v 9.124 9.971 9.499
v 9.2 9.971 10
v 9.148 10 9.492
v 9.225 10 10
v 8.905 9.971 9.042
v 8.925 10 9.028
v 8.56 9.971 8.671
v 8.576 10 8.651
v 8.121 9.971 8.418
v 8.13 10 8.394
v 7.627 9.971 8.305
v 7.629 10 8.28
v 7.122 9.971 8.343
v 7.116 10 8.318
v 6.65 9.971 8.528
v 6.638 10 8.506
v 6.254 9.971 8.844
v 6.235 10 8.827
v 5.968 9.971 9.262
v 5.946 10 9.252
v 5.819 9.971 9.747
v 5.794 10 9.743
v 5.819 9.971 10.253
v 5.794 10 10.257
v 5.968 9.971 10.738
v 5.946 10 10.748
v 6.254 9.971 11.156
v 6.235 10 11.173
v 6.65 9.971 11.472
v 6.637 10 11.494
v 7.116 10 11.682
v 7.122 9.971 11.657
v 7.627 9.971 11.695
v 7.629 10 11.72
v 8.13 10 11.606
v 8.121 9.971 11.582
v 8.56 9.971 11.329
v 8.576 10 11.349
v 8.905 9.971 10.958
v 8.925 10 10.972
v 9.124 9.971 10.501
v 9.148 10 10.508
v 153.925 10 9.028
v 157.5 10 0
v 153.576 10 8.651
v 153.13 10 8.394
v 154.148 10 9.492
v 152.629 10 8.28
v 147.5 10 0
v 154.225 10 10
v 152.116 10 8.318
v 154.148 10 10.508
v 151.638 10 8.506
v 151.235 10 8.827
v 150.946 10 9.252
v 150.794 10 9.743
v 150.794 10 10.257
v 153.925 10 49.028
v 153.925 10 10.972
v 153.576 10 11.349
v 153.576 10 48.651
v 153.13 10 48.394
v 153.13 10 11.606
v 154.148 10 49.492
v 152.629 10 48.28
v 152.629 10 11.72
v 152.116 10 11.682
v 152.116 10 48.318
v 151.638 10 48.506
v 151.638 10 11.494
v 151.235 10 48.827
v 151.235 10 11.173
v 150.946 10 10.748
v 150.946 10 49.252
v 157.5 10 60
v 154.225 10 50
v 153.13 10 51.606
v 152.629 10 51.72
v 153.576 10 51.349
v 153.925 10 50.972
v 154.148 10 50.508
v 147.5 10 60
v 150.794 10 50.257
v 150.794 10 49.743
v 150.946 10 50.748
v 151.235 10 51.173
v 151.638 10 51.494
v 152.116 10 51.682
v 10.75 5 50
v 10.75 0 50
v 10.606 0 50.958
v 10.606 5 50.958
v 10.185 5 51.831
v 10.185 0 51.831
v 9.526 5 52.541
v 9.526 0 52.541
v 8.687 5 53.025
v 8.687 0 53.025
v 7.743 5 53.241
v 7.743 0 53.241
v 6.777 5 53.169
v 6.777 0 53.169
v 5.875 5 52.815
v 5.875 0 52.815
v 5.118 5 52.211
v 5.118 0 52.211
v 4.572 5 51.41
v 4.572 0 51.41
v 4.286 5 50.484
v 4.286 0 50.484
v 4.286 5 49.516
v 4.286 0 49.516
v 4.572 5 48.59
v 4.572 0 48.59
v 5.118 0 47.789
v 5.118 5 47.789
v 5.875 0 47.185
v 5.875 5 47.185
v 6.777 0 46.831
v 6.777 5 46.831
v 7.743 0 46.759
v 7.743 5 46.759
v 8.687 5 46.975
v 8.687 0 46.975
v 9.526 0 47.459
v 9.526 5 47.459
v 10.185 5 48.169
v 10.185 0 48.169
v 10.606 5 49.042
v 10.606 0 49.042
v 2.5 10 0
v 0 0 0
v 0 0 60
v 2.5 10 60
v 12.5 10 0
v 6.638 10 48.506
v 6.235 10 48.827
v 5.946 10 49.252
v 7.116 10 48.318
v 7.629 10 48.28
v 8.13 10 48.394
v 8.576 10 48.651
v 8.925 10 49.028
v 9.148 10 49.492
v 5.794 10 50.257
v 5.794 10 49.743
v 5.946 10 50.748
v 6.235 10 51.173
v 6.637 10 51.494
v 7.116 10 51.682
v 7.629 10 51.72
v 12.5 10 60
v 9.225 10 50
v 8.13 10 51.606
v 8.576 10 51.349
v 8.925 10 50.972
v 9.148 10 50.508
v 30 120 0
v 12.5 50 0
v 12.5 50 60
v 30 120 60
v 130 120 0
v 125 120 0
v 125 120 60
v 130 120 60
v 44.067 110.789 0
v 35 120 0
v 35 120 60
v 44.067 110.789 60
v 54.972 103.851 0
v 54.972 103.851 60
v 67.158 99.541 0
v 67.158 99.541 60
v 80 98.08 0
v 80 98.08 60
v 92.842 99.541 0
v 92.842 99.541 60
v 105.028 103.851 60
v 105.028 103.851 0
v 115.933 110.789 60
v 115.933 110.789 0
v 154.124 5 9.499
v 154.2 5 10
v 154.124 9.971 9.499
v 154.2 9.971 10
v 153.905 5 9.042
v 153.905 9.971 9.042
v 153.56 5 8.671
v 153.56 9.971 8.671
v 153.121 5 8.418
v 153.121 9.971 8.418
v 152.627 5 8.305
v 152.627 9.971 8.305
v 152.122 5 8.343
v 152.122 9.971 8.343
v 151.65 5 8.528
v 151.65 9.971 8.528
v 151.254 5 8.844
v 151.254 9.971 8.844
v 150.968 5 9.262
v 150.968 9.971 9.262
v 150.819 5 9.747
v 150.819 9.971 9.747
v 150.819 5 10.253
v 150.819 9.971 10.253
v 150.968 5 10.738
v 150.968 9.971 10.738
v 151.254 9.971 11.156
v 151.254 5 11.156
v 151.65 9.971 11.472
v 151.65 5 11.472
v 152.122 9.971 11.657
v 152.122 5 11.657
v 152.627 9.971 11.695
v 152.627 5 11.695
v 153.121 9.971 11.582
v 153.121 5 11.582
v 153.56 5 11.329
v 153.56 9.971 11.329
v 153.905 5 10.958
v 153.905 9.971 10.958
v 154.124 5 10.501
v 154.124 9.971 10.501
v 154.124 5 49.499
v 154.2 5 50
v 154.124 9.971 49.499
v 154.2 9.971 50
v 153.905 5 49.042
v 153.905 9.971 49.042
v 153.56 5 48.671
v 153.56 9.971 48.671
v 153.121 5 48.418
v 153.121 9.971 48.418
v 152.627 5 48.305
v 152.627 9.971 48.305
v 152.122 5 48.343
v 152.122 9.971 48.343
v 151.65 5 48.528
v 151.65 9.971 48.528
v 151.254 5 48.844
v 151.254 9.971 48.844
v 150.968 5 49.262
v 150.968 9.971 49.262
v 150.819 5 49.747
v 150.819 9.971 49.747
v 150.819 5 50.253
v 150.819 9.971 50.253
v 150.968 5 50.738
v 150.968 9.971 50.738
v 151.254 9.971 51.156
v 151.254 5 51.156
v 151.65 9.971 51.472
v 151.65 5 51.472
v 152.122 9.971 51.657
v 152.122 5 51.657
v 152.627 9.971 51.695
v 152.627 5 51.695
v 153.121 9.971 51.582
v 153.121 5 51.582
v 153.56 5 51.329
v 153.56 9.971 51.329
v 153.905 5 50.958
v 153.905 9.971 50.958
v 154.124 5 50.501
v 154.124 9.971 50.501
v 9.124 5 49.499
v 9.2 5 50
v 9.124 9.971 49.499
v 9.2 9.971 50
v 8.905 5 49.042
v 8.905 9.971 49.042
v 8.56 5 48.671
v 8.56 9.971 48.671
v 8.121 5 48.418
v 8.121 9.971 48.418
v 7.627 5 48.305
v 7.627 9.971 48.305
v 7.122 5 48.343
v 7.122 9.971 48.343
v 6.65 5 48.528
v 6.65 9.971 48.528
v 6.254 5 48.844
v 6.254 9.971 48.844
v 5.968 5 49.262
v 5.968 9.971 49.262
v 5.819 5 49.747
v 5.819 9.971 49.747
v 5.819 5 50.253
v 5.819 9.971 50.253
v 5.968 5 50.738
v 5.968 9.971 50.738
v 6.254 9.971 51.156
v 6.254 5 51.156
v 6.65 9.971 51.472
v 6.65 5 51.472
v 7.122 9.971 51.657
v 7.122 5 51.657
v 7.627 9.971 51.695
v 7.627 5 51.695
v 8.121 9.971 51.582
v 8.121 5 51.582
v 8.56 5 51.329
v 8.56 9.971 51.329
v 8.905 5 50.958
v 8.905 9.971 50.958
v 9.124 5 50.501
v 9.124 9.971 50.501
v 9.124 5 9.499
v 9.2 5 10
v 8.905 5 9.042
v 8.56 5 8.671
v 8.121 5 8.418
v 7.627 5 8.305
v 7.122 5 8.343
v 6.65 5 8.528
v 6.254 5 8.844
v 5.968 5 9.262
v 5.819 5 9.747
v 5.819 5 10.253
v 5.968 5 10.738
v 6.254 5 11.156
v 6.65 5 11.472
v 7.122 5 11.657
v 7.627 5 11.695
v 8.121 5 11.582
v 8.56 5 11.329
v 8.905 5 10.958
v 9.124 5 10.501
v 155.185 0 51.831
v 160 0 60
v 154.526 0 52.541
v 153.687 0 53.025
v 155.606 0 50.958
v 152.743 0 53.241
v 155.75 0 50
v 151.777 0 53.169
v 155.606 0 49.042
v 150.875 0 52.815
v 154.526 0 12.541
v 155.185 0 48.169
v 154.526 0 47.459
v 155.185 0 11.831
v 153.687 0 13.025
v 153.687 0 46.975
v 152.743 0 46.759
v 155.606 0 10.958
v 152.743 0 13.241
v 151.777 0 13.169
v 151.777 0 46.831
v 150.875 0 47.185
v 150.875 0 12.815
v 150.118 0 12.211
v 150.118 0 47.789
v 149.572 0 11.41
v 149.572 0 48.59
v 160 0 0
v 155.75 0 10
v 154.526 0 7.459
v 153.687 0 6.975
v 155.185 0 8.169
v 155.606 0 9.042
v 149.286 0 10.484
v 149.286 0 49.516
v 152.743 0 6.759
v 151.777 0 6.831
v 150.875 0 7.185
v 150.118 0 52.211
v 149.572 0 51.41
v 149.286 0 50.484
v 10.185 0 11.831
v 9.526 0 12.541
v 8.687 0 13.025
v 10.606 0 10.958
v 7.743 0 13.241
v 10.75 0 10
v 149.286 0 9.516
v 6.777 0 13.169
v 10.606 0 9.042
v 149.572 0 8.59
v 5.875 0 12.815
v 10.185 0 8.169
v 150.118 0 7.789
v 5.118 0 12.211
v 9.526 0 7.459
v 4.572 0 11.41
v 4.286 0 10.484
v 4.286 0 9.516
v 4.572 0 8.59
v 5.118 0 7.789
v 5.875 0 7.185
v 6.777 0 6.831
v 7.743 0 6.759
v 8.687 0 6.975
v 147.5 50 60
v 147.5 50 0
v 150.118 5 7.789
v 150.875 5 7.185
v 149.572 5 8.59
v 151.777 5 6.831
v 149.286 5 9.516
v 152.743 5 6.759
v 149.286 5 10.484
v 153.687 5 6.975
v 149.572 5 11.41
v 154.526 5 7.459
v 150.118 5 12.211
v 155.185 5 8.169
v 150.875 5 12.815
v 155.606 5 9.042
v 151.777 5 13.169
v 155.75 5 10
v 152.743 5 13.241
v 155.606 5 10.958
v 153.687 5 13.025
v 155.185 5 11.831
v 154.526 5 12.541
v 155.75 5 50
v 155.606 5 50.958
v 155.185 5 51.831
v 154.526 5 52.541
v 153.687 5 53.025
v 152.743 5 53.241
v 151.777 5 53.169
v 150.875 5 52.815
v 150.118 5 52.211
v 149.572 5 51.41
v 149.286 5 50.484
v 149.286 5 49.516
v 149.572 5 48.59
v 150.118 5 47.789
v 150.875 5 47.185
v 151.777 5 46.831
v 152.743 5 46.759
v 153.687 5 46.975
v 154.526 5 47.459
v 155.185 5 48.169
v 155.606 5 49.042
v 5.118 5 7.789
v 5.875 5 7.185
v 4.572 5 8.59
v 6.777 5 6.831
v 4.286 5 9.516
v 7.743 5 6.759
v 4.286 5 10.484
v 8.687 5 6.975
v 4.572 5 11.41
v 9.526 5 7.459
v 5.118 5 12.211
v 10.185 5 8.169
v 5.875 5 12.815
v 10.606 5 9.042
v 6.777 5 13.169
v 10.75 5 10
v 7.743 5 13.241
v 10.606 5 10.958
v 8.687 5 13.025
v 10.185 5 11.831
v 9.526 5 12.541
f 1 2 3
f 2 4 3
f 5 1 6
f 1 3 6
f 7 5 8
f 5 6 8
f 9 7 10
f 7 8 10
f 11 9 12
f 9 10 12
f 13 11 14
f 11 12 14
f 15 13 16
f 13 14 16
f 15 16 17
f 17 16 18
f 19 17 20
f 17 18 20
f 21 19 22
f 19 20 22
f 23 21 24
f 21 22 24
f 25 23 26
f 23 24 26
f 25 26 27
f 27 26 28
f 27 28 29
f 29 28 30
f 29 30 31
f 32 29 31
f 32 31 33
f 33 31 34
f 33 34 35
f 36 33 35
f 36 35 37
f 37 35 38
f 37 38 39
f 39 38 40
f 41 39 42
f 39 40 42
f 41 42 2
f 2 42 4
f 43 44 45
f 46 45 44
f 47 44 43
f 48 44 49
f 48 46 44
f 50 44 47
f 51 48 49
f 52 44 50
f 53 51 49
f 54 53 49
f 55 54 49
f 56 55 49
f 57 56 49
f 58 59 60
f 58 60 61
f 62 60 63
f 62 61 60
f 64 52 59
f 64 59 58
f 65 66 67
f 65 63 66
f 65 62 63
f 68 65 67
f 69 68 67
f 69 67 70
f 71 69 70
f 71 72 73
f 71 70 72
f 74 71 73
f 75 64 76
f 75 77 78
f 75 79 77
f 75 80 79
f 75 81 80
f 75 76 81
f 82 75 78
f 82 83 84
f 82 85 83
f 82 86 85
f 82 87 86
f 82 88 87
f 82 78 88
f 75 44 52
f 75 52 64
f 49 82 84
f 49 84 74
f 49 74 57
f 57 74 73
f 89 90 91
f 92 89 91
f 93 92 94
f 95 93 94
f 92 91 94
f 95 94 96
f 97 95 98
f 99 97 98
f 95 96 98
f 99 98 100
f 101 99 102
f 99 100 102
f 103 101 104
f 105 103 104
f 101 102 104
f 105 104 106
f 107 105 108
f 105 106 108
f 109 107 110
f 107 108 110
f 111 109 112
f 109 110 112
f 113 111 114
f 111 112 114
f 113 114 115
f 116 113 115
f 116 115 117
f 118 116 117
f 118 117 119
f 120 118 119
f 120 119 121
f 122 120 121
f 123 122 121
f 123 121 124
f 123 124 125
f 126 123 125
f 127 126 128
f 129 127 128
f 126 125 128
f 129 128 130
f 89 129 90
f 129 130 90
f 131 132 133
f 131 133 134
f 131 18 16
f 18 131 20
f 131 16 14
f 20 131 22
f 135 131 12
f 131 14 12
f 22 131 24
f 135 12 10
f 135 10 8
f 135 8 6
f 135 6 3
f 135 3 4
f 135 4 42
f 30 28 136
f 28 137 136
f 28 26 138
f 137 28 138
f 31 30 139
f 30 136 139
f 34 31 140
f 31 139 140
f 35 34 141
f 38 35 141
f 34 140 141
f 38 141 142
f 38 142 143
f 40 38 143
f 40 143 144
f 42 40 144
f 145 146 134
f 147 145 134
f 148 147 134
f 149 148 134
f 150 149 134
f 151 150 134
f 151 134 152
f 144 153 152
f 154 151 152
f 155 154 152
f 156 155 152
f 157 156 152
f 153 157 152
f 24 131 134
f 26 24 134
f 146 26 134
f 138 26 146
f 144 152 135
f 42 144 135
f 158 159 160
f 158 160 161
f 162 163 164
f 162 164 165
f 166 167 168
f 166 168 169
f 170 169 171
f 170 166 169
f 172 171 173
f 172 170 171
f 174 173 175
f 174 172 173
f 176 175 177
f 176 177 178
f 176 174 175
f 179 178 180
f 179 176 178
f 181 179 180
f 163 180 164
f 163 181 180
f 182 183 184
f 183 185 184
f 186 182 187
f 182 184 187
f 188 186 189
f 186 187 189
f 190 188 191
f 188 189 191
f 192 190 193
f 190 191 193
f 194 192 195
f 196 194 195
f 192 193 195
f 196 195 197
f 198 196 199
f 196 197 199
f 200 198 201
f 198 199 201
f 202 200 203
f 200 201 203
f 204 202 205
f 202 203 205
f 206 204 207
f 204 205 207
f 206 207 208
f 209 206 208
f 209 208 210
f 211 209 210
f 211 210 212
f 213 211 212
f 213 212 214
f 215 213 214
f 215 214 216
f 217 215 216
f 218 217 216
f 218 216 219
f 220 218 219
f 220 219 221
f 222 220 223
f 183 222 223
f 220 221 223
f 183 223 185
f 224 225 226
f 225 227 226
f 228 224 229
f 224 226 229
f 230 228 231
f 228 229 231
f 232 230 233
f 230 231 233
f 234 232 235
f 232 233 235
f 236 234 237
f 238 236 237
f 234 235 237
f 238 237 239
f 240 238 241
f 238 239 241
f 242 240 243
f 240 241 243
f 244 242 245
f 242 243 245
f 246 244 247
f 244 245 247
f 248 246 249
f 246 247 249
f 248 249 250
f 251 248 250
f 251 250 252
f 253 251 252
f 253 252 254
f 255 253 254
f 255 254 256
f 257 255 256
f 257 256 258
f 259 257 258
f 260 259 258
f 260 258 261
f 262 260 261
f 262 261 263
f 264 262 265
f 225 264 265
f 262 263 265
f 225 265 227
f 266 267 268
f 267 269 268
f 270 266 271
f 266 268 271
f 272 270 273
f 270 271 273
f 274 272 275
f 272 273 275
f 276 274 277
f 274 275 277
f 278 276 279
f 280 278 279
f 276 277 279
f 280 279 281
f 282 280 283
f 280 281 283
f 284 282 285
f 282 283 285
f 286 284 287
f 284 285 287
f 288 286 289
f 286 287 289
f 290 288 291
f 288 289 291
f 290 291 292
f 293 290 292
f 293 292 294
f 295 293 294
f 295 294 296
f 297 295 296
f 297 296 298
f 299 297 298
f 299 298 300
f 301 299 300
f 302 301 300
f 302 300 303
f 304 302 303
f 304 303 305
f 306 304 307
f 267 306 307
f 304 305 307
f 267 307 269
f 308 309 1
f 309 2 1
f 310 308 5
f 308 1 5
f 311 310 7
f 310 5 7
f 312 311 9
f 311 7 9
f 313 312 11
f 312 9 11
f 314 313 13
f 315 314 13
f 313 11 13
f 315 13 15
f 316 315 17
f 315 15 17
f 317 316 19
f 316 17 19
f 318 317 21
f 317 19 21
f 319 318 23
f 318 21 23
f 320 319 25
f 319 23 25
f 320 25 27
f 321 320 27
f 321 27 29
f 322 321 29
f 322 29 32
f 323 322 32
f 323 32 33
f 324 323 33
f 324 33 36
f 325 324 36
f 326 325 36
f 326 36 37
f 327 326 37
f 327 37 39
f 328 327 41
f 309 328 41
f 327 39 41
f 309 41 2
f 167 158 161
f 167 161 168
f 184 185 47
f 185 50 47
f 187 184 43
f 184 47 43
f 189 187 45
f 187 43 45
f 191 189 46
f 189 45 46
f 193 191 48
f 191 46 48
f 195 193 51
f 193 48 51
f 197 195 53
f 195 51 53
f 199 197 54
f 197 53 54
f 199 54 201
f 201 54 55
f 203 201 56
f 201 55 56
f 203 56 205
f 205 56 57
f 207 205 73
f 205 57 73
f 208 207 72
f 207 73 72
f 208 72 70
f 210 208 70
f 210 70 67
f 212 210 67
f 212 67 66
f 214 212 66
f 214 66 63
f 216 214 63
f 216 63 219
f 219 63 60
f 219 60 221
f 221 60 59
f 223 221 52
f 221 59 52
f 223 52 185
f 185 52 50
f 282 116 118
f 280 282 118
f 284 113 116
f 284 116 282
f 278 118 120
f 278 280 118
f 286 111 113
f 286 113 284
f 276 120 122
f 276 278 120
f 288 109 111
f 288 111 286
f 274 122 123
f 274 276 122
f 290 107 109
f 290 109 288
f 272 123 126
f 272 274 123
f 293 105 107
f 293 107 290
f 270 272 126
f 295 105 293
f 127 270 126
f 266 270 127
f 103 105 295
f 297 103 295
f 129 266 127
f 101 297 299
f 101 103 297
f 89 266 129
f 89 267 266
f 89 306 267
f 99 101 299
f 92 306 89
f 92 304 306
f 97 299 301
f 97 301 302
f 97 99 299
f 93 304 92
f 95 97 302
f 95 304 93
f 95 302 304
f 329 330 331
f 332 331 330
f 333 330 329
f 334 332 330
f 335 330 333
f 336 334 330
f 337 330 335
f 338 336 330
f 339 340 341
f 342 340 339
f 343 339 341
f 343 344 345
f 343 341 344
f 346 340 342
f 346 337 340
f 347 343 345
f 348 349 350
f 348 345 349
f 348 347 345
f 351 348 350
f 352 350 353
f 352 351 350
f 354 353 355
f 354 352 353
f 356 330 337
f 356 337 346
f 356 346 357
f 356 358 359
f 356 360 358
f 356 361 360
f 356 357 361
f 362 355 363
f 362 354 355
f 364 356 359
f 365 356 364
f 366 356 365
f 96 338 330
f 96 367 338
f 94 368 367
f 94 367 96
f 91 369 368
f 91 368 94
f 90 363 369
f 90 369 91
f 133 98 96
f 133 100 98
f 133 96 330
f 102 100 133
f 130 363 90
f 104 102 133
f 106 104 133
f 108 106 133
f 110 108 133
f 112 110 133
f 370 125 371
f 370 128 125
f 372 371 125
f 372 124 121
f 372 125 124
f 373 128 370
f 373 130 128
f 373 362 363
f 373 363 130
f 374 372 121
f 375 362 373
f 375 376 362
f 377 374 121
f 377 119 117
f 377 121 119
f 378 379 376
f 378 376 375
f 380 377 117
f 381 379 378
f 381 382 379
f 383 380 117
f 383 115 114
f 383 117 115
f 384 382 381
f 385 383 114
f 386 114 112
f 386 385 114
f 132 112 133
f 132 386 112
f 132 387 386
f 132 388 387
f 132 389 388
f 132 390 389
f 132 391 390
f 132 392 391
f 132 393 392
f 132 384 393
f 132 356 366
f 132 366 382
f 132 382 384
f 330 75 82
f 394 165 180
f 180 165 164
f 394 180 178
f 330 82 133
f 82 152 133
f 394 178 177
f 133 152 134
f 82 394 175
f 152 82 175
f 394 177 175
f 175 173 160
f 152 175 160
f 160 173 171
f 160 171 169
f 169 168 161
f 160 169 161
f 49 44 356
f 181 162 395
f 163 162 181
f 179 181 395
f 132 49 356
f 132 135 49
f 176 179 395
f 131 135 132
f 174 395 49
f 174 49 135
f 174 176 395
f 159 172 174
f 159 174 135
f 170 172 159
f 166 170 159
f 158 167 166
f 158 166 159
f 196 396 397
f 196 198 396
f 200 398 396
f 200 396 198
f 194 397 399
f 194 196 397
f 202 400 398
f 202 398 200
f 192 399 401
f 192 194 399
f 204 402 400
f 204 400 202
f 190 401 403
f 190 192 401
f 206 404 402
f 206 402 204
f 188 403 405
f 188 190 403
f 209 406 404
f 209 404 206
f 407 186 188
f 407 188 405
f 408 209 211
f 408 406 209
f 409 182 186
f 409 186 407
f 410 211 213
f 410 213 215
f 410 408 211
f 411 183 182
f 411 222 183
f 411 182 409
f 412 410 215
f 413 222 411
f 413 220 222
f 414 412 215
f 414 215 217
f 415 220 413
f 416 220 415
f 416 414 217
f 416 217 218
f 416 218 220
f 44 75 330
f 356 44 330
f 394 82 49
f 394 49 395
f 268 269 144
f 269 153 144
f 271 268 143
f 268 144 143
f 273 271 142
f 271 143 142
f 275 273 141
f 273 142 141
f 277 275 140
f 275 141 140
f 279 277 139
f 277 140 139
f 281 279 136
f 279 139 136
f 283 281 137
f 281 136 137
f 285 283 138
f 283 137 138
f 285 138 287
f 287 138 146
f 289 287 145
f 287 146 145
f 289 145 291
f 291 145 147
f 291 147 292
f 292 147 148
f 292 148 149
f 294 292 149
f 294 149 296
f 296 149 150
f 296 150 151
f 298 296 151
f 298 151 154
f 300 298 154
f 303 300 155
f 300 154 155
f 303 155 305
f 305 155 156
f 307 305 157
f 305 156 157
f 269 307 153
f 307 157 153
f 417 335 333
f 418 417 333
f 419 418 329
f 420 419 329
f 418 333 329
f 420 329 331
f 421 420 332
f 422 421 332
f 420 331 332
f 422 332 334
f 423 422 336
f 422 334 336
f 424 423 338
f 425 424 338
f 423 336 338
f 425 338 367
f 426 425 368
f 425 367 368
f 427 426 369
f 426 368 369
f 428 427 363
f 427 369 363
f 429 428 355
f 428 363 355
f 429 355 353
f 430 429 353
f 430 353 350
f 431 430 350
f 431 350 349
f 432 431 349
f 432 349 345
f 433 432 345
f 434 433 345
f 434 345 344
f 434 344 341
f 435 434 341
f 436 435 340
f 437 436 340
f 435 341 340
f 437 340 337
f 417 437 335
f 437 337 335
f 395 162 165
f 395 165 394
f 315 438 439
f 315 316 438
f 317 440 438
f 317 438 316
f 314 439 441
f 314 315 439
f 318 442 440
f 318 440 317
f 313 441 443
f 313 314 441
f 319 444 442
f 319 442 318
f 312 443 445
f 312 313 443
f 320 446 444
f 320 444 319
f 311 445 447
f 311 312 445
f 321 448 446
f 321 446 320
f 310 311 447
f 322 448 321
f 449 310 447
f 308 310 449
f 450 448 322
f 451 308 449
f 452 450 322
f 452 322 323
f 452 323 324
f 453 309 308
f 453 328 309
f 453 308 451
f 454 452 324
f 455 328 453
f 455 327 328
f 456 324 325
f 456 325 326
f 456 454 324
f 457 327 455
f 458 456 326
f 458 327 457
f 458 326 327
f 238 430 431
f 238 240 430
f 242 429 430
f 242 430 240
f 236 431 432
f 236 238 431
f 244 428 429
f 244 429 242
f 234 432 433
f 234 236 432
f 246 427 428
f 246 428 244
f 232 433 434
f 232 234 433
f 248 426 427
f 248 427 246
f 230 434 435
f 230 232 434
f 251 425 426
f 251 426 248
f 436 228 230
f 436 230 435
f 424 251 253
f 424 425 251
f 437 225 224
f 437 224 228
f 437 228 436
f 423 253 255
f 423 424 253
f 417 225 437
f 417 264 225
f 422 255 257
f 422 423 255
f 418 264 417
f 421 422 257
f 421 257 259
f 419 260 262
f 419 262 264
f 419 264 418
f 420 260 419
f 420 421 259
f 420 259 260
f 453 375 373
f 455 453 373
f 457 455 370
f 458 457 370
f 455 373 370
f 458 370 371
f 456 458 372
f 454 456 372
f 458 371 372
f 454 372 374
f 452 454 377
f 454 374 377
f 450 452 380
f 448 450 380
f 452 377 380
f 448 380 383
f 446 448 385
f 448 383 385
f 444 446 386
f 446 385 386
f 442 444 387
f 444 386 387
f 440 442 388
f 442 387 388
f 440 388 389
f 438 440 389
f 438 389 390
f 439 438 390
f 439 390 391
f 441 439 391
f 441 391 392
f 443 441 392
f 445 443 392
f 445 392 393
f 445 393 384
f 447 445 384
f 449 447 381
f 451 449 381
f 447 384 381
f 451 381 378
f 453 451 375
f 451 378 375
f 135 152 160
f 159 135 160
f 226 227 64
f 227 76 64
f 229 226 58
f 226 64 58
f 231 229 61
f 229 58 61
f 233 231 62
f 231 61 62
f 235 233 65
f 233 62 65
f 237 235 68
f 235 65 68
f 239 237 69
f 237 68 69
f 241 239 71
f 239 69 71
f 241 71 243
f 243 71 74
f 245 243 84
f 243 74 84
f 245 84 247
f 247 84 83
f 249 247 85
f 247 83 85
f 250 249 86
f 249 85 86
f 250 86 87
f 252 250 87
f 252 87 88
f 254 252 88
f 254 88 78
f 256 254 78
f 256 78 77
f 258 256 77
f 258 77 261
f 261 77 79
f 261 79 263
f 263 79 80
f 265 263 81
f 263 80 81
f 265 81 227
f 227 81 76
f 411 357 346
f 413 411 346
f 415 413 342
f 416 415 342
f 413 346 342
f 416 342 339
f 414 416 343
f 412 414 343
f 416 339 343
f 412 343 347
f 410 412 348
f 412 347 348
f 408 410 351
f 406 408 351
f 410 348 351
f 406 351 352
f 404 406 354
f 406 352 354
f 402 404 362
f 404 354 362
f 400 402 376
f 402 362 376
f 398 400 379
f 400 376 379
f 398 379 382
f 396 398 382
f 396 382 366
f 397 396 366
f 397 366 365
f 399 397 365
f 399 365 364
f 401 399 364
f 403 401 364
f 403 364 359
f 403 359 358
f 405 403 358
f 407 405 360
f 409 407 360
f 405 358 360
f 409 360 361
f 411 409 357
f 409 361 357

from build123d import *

# Parameters (mm, degrees)
EXTRUDE_1_DEPTH     = 60
CUT_EXTRUDE_1_REACH = 210.806
SKETCH_7_R          = 3.25
CUT_EXTRUDE_2_DEPTH = 5


# Read off the part's stored shape, not the designer's step: M3 すきま穴1
with BuildPart() as part:
    # ｽｹｯﾁ1 → ﾎﾞｽ - 押し出し1 (new body)
    with BuildSketch(Plane.XY):
        with BuildLine():
            Line((0, 0), (30, 120))
            Line((30, 120), (35, 120))
            ThreePointArc((35, 120), (80, 98.079568547), (125, 120))
            Line((125, 120), (130, 120))
            Line((130, 120), (160, 0))
            Line((160, 0), (0, 0))
        make_face()
    extrude(amount=EXTRUDE_1_DEPTH)

    # ｽｹｯﾁ2 → ｶｯﾄ - 押し出し1 (cut, up to next)
    with BuildSketch(Plane.XY.offset(60), mode=Mode.PRIVATE) as cut_extrude_1_sk1:
        Polygon((2.5, 10), (12.5, 10), (12.5, 50), align=None)
    cut_extrude_1_tool1 = extrude(cut_extrude_1_sk1.sketch, amount=-CUT_EXTRUDE_1_REACH, mode=Mode.PRIVATE) & part.part
    # ｽｹｯﾁ2 → ｶｯﾄ - 押し出し1 (cut, up to next)
    with BuildSketch(Plane.XY.offset(60), mode=Mode.PRIVATE) as cut_extrude_1_sk2:
        Polygon((157.5, 10), (147.5, 10), (147.5, 50), align=None)
    cut_extrude_1_tool2 = extrude(cut_extrude_1_sk2.sketch, amount=-CUT_EXTRUDE_1_REACH, mode=Mode.PRIVATE) & part.part
    add(cut_extrude_1_tool1.solids().sort_by_distance((9.166667, 23.333333, 60))[0], mode=Mode.SUBTRACT)
    add(cut_extrude_1_tool2.solids().sort_by_distance((150.833333, 23.333333, 60))[0], mode=Mode.SUBTRACT)

    # M3 すきま穴1 outline → M3 すきま穴1 (revolve, cut)
    with BuildSketch(Plane(origin=(152.5, 0, 50), x_dir=(1, 0, 0), z_dir=(0, 0, 1))):
        Polygon((0, 0), (1.7, 0), (1.7, 9.97124079), (1.725, 10), (0, 10), align=None)
    revolve(axis=Axis((152.5, 0, 50), (0, 1, 0)), mode=Mode.SUBTRACT)

    # Hole Wizard M3 _1 2 outline → Hole Wizard M3 _1 2 (revolve, cut)
    with BuildSketch(Plane(origin=(152.5, 0, 10), x_dir=(1, 0, 0), z_dir=(0, 0, 1))):
        Polygon((0, 0), (1.7, 0), (1.7, 9.97124079), (1.725, 10), (0, 10), align=None)
    revolve(axis=Axis((152.5, 0, 10), (0, 1, 0)), mode=Mode.SUBTRACT)

    # Hole Wizard M3 _1 3 outline → Hole Wizard M3 _1 3 (revolve, cut)
    with BuildSketch(Plane(origin=(7.5, 0, 50), x_dir=(1, 0, 0), z_dir=(0, 0, 1))):
        Polygon((0, 0), (1.7, 0), (1.7, 9.97124079), (1.725, 10), (0, 10), align=None)
    revolve(axis=Axis((7.5, 0, 50), (0, 1, 0)), mode=Mode.SUBTRACT)

    # Hole Wizard M3 _1 4 outline → Hole Wizard M3 _1 4 (revolve, cut)
    with BuildSketch(Plane(origin=(7.5, 0, 10), x_dir=(1, 0, 0), z_dir=(0, 0, 1))):
        Polygon((0, 0), (1.7, 0), (1.7, 9.97124079), (1.725, 10), (0, 10), align=None)
    revolve(axis=Axis((7.5, 0, 10), (0, 1, 0)), mode=Mode.SUBTRACT)

    # ｽｹｯﾁ7 → ｶｯﾄ - 押し出し2 (cut)
    with BuildSketch(Plane.XZ):
        with Locations((7.5, 50)):
            Circle(SKETCH_7_R)
        with Locations((7.5, 10)):
            Circle(SKETCH_7_R)
        with Locations((152.5, 10)):
            Circle(SKETCH_7_R)
        with Locations((152.5, 50)):
            Circle(SKETCH_7_R)
    extrude(amount=-CUT_EXTRUDE_2_DEPTH, mode=Mode.SUBTRACT)


solid = part.part
